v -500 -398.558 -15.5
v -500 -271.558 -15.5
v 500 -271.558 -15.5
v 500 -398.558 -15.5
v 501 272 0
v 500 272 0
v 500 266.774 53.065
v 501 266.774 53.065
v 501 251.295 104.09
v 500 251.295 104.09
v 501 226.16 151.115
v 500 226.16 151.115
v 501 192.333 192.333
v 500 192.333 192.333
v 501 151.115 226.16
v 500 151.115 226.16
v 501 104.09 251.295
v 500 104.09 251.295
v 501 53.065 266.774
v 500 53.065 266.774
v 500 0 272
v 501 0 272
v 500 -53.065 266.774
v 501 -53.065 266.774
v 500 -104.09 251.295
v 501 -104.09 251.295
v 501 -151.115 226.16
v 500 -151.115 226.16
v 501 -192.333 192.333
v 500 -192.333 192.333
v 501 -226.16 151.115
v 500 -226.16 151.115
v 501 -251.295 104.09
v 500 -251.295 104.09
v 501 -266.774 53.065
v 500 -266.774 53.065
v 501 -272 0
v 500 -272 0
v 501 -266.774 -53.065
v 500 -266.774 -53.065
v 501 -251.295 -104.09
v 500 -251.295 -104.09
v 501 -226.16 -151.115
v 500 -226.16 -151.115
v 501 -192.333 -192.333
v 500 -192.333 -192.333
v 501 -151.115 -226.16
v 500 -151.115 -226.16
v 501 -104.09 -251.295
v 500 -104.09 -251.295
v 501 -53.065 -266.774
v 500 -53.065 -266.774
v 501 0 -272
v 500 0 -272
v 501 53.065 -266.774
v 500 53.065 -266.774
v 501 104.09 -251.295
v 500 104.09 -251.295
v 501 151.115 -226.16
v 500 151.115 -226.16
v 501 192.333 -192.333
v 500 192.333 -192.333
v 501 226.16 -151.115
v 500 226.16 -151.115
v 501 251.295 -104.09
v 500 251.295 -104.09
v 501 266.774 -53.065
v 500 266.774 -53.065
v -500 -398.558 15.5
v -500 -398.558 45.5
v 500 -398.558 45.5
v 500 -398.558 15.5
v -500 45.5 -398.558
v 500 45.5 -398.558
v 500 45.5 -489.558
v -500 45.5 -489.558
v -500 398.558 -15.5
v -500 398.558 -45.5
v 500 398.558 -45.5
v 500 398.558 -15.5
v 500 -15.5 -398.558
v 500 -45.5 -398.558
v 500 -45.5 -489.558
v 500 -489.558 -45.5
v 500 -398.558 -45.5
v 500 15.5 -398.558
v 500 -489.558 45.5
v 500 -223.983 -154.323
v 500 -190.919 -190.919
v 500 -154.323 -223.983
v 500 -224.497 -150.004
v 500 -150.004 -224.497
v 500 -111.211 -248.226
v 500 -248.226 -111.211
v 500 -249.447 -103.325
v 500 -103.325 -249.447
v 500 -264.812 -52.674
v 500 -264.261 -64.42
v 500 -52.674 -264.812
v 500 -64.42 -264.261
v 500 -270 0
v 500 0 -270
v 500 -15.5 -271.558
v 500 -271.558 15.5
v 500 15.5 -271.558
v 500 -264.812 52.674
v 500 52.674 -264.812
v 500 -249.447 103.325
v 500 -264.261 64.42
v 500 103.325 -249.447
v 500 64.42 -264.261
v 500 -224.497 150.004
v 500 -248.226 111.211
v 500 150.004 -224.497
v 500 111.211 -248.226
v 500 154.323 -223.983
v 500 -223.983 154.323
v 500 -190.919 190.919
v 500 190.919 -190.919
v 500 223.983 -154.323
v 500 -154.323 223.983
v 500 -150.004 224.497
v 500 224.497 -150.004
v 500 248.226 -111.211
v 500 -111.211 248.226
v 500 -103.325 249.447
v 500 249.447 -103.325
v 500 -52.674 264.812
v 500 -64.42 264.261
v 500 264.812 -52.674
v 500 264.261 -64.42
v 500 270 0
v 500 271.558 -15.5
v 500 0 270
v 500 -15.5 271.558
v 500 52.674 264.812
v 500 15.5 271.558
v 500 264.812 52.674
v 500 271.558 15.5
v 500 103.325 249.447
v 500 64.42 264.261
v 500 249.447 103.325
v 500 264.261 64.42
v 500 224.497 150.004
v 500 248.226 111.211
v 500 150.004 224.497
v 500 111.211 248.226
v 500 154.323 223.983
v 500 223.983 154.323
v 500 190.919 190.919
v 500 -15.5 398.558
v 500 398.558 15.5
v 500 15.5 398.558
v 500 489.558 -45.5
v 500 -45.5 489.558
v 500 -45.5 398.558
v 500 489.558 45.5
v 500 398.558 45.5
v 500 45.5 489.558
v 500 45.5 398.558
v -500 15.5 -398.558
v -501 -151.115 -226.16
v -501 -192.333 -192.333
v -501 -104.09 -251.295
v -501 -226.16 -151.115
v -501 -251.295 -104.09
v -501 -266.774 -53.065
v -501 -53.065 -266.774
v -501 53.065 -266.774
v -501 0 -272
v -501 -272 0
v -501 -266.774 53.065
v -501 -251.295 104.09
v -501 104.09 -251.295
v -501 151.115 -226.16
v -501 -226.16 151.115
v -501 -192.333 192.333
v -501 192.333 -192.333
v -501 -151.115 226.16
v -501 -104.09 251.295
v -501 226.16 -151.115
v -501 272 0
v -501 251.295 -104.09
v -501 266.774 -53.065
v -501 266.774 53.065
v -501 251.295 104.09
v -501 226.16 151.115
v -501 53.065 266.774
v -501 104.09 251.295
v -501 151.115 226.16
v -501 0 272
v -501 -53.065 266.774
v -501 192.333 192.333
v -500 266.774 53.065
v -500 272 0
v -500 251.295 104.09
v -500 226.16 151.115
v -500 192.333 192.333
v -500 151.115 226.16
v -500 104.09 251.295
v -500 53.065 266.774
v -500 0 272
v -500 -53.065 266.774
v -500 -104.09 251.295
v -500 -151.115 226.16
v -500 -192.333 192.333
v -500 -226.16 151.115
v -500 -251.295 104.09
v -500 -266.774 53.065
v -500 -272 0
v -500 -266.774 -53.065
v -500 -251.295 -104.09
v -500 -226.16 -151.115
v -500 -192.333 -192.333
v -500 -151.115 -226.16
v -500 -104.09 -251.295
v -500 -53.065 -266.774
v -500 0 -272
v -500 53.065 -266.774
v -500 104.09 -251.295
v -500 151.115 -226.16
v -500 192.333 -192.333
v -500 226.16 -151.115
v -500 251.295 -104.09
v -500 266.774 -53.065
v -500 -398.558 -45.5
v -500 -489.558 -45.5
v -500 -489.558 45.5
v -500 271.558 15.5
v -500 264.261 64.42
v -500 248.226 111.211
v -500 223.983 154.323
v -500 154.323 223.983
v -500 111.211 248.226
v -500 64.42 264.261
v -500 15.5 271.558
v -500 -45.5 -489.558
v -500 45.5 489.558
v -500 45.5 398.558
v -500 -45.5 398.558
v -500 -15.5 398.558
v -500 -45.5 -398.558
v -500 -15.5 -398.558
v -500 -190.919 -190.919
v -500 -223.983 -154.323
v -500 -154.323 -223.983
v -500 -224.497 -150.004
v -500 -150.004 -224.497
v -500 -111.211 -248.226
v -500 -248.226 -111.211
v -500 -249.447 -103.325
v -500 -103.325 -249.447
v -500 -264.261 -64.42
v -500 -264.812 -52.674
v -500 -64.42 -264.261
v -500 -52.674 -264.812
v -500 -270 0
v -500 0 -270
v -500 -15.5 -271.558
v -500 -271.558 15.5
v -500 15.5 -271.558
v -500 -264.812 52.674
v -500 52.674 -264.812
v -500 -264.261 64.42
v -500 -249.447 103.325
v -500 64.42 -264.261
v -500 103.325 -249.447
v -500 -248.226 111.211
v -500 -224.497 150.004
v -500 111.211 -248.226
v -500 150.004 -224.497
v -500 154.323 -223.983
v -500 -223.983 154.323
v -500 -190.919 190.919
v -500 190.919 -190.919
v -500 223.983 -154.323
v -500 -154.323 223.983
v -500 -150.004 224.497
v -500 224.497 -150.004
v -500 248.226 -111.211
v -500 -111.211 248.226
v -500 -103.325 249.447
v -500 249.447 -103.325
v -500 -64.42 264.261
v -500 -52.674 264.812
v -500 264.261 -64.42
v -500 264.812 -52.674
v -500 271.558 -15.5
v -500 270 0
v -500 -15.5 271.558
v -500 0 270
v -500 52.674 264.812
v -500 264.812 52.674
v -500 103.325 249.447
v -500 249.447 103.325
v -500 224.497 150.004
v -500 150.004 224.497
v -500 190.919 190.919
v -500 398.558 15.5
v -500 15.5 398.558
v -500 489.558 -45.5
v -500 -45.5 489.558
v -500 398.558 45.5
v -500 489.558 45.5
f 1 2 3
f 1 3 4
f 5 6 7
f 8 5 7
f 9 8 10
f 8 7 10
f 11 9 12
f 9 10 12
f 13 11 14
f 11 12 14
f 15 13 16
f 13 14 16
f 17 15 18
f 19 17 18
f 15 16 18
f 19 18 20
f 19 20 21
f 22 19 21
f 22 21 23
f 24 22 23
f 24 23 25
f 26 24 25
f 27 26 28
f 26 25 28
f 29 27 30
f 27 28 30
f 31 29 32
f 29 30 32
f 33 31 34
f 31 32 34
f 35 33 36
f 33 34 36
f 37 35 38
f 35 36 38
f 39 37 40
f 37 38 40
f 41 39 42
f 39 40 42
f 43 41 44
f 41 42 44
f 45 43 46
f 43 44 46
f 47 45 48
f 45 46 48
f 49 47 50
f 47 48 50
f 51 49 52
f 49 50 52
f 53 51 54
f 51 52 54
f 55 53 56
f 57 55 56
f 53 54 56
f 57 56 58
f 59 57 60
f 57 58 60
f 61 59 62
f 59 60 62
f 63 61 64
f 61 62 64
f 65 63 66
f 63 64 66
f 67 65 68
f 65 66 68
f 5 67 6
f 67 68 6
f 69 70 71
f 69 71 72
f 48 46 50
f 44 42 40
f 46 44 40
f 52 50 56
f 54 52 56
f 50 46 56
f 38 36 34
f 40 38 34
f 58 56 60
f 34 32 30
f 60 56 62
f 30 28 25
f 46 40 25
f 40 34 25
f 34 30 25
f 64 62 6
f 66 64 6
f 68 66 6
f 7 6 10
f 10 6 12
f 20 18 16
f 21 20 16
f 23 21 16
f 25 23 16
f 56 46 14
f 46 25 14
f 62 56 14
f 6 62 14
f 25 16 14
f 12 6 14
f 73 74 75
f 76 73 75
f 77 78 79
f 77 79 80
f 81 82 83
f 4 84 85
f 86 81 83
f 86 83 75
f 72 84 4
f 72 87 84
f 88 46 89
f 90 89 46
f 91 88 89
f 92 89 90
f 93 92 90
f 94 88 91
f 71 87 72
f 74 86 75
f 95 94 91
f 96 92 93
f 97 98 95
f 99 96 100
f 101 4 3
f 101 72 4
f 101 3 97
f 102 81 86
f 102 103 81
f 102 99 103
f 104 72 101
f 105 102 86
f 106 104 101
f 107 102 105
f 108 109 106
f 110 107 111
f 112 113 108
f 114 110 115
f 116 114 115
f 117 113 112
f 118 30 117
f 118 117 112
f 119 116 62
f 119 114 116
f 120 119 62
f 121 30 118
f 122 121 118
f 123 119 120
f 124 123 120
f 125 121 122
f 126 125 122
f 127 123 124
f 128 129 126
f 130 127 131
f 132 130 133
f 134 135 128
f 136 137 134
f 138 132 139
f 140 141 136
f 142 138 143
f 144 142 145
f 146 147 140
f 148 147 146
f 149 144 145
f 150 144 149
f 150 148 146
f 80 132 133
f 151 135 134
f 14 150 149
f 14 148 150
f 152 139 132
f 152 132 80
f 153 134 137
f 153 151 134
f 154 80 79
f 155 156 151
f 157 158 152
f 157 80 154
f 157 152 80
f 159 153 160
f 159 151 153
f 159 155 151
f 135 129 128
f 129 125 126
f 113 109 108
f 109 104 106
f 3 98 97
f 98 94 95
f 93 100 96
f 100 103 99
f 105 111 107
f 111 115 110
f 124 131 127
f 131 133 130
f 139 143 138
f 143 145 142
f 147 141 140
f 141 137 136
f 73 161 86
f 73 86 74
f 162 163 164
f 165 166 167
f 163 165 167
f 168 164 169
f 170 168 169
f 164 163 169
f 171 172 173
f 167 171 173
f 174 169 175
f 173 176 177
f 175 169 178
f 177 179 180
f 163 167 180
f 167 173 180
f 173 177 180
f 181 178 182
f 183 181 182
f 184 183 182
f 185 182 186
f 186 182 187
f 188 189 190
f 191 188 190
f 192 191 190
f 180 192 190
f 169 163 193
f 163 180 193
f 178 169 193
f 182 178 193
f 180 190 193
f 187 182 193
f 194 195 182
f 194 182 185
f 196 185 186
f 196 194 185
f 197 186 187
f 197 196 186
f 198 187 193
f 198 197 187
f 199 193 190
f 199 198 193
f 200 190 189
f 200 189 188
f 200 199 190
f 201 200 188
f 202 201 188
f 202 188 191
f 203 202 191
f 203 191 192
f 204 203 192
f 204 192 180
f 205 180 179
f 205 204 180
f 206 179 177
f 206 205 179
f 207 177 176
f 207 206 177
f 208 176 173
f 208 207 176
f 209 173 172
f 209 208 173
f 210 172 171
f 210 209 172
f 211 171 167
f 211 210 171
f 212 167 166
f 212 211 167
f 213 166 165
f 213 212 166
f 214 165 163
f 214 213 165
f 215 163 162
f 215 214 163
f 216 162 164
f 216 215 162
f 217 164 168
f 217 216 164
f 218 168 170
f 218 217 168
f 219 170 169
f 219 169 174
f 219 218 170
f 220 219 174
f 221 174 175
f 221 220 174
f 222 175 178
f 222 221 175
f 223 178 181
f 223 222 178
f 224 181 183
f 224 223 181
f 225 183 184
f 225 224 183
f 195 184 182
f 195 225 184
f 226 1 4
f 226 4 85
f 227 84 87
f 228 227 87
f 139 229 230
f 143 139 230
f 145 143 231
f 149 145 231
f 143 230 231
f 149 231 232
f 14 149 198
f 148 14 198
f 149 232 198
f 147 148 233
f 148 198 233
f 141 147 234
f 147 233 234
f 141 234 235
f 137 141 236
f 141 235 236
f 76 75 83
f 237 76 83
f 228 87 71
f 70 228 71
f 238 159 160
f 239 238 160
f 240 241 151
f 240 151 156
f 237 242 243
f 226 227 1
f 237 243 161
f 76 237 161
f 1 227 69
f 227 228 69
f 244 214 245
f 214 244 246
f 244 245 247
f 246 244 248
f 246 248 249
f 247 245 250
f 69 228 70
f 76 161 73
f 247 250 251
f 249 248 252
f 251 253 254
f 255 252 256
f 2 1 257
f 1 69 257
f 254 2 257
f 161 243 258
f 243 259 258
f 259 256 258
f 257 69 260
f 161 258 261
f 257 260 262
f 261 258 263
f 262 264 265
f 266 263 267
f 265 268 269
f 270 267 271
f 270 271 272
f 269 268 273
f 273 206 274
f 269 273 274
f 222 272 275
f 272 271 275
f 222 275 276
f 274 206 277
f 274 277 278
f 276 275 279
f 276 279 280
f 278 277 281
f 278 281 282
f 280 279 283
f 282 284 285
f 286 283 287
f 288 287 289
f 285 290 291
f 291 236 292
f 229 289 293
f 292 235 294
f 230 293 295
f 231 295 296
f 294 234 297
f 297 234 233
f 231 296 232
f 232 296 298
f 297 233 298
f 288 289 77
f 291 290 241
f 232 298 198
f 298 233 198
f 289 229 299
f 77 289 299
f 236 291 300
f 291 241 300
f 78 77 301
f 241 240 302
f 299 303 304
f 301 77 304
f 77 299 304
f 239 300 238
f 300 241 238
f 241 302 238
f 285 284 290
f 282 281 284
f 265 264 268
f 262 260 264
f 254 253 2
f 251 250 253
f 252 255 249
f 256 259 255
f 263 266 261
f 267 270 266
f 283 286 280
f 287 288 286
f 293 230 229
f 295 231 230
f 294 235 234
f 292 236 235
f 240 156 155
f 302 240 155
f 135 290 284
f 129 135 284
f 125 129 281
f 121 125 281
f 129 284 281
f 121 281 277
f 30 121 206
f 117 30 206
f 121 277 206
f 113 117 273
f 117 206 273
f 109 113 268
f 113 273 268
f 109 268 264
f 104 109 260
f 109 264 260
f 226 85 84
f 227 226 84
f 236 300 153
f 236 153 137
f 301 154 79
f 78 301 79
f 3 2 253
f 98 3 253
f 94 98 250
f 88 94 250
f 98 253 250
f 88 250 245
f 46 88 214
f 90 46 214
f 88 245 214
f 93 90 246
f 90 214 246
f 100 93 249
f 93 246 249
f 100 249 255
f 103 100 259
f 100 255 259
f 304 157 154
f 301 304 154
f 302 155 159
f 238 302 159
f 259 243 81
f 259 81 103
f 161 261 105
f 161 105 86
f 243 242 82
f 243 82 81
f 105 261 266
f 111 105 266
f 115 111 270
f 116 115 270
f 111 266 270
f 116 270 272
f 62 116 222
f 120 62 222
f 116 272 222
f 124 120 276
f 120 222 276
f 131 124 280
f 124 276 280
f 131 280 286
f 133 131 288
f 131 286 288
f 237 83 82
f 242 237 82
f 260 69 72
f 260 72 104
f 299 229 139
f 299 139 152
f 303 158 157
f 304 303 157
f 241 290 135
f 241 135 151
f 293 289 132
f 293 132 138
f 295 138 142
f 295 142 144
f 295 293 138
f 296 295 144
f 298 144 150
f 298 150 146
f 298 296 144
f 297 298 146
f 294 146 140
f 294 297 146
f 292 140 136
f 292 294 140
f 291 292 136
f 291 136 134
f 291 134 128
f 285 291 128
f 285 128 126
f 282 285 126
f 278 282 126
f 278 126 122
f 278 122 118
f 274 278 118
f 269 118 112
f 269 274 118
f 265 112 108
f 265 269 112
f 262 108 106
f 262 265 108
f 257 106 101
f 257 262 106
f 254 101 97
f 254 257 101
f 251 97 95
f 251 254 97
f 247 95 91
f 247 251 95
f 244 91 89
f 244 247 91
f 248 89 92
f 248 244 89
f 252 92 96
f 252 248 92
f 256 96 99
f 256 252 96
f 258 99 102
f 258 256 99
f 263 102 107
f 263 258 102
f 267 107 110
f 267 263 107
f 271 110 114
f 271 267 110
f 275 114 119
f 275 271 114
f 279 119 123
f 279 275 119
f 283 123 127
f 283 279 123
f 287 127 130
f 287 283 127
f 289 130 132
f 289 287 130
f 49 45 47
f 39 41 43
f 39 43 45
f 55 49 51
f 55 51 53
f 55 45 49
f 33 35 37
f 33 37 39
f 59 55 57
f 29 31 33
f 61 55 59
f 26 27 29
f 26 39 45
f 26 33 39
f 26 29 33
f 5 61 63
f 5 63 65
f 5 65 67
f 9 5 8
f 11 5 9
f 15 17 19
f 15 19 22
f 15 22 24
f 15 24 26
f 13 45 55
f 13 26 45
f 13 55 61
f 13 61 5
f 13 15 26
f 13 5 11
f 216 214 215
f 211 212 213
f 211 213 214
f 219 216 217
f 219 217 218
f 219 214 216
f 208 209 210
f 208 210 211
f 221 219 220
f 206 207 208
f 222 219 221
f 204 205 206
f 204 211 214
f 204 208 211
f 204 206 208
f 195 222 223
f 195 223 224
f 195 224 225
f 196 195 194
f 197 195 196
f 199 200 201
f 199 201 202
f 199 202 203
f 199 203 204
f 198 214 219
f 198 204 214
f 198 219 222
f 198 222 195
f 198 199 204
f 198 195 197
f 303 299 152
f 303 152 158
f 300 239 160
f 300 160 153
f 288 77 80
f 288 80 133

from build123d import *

# Parameters (mm, degrees)
SKETCH001_R  = 272
PAD_DEPTH    = 1
SKETCH_R     = 270
PAD001_DEPTH = 1000
SKETCH002_R  = 272
PAD002_DEPTH = 1


with BuildPart() as pad:
    # Sketch001 → Pad (new body)
    with BuildSketch(Plane.YZ.offset(-500)):
        Circle(SKETCH001_R)
    extrude(amount=-PAD_DEPTH)


with BuildPart() as pad001:
    # Sketch → Pad001 (new body)
    with BuildSketch(Plane.YZ.offset(-500)):
        with BuildLine():
            ThreePointArc((-15.5, 271.558005), (-192.333044, 192.333044), (-271.558005, 15.5))
            Line((-398.558005, 15.5), (-271.558005, 15.5))
            Line((-398.558005, 45.5), (-398.558005, 15.5))
            Line((-489.558005, 45.5), (-398.558005, 45.5))
            Line((-489.558005, -45.5), (-489.558005, 45.5))
            Line((-398.558005, -45.5), (-489.558005, -45.5))
            Line((-398.558005, -15.5), (-398.558005, -45.5))
            Line((-271.558005, -15.5), (-398.558005, -15.5))
            ThreePointArc((-271.558005, -15.5), (-192.333044, -192.333044), (-15.5, -271.558005))
            Line((-15.5, -398.558005), (-15.5, -271.558005))
            Line((-45.5, -398.558005), (-15.5, -398.558005))
            Line((-45.5, -489.558005), (-45.5, -398.558005))
            Line((45.5, -489.558005), (-45.5, -489.558005))
            Line((45.5, -398.558005), (45.5, -489.558005))
            Line((15.5, -398.558005), (45.5, -398.558005))
            Line((15.5, -271.558005), (15.5, -398.558005))
            ThreePointArc((15.5, -271.558005), (192.333044, -192.333044), (271.558005, -15.5))
            Line((398.558005, -15.5), (271.558005, -15.5))
            Line((398.558005, -45.5), (398.558005, -15.5))
            Line((489.558005, -45.5), (398.558005, -45.5))
            Line((489.558005, 45.5), (489.558005, -45.5))
            Line((398.558005, 45.5), (489.558005, 45.5))
            Line((398.558005, 15.5), (398.558005, 45.5))
            Line((271.558005, 15.5), (398.558005, 15.5))
            ThreePointArc((271.558005, 15.5), (192.333044, 192.333044), (15.5, 271.558005))
            Line((15.5, 398.558005), (15.5, 271.558005))
            Line((45.5, 398.558005), (15.5, 398.558005))
            Line((45.5, 489.558005), (45.5, 398.558005))
            Line((-45.5, 489.558005), (45.5, 489.558005))
            Line((-45.5, 398.558005), (-45.5, 489.558005))
            Line((-15.5, 398.558005), (-45.5, 398.558005))
            Line((-15.5, 271.558005), (-15.5, 398.558005))
        make_face()
        Circle(SKETCH_R, mode=Mode.SUBTRACT)
    extrude(amount=PAD001_DEPTH)


with BuildPart() as pad002:
    # Sketch002 → Pad002 (new body)
    with BuildSketch(Plane.YZ.offset(500)):
        Circle(SKETCH002_R)
    extrude(amount=PAD002_DEPTH)


solid = Compound([pad.part, pad001.part, pad002.part])
